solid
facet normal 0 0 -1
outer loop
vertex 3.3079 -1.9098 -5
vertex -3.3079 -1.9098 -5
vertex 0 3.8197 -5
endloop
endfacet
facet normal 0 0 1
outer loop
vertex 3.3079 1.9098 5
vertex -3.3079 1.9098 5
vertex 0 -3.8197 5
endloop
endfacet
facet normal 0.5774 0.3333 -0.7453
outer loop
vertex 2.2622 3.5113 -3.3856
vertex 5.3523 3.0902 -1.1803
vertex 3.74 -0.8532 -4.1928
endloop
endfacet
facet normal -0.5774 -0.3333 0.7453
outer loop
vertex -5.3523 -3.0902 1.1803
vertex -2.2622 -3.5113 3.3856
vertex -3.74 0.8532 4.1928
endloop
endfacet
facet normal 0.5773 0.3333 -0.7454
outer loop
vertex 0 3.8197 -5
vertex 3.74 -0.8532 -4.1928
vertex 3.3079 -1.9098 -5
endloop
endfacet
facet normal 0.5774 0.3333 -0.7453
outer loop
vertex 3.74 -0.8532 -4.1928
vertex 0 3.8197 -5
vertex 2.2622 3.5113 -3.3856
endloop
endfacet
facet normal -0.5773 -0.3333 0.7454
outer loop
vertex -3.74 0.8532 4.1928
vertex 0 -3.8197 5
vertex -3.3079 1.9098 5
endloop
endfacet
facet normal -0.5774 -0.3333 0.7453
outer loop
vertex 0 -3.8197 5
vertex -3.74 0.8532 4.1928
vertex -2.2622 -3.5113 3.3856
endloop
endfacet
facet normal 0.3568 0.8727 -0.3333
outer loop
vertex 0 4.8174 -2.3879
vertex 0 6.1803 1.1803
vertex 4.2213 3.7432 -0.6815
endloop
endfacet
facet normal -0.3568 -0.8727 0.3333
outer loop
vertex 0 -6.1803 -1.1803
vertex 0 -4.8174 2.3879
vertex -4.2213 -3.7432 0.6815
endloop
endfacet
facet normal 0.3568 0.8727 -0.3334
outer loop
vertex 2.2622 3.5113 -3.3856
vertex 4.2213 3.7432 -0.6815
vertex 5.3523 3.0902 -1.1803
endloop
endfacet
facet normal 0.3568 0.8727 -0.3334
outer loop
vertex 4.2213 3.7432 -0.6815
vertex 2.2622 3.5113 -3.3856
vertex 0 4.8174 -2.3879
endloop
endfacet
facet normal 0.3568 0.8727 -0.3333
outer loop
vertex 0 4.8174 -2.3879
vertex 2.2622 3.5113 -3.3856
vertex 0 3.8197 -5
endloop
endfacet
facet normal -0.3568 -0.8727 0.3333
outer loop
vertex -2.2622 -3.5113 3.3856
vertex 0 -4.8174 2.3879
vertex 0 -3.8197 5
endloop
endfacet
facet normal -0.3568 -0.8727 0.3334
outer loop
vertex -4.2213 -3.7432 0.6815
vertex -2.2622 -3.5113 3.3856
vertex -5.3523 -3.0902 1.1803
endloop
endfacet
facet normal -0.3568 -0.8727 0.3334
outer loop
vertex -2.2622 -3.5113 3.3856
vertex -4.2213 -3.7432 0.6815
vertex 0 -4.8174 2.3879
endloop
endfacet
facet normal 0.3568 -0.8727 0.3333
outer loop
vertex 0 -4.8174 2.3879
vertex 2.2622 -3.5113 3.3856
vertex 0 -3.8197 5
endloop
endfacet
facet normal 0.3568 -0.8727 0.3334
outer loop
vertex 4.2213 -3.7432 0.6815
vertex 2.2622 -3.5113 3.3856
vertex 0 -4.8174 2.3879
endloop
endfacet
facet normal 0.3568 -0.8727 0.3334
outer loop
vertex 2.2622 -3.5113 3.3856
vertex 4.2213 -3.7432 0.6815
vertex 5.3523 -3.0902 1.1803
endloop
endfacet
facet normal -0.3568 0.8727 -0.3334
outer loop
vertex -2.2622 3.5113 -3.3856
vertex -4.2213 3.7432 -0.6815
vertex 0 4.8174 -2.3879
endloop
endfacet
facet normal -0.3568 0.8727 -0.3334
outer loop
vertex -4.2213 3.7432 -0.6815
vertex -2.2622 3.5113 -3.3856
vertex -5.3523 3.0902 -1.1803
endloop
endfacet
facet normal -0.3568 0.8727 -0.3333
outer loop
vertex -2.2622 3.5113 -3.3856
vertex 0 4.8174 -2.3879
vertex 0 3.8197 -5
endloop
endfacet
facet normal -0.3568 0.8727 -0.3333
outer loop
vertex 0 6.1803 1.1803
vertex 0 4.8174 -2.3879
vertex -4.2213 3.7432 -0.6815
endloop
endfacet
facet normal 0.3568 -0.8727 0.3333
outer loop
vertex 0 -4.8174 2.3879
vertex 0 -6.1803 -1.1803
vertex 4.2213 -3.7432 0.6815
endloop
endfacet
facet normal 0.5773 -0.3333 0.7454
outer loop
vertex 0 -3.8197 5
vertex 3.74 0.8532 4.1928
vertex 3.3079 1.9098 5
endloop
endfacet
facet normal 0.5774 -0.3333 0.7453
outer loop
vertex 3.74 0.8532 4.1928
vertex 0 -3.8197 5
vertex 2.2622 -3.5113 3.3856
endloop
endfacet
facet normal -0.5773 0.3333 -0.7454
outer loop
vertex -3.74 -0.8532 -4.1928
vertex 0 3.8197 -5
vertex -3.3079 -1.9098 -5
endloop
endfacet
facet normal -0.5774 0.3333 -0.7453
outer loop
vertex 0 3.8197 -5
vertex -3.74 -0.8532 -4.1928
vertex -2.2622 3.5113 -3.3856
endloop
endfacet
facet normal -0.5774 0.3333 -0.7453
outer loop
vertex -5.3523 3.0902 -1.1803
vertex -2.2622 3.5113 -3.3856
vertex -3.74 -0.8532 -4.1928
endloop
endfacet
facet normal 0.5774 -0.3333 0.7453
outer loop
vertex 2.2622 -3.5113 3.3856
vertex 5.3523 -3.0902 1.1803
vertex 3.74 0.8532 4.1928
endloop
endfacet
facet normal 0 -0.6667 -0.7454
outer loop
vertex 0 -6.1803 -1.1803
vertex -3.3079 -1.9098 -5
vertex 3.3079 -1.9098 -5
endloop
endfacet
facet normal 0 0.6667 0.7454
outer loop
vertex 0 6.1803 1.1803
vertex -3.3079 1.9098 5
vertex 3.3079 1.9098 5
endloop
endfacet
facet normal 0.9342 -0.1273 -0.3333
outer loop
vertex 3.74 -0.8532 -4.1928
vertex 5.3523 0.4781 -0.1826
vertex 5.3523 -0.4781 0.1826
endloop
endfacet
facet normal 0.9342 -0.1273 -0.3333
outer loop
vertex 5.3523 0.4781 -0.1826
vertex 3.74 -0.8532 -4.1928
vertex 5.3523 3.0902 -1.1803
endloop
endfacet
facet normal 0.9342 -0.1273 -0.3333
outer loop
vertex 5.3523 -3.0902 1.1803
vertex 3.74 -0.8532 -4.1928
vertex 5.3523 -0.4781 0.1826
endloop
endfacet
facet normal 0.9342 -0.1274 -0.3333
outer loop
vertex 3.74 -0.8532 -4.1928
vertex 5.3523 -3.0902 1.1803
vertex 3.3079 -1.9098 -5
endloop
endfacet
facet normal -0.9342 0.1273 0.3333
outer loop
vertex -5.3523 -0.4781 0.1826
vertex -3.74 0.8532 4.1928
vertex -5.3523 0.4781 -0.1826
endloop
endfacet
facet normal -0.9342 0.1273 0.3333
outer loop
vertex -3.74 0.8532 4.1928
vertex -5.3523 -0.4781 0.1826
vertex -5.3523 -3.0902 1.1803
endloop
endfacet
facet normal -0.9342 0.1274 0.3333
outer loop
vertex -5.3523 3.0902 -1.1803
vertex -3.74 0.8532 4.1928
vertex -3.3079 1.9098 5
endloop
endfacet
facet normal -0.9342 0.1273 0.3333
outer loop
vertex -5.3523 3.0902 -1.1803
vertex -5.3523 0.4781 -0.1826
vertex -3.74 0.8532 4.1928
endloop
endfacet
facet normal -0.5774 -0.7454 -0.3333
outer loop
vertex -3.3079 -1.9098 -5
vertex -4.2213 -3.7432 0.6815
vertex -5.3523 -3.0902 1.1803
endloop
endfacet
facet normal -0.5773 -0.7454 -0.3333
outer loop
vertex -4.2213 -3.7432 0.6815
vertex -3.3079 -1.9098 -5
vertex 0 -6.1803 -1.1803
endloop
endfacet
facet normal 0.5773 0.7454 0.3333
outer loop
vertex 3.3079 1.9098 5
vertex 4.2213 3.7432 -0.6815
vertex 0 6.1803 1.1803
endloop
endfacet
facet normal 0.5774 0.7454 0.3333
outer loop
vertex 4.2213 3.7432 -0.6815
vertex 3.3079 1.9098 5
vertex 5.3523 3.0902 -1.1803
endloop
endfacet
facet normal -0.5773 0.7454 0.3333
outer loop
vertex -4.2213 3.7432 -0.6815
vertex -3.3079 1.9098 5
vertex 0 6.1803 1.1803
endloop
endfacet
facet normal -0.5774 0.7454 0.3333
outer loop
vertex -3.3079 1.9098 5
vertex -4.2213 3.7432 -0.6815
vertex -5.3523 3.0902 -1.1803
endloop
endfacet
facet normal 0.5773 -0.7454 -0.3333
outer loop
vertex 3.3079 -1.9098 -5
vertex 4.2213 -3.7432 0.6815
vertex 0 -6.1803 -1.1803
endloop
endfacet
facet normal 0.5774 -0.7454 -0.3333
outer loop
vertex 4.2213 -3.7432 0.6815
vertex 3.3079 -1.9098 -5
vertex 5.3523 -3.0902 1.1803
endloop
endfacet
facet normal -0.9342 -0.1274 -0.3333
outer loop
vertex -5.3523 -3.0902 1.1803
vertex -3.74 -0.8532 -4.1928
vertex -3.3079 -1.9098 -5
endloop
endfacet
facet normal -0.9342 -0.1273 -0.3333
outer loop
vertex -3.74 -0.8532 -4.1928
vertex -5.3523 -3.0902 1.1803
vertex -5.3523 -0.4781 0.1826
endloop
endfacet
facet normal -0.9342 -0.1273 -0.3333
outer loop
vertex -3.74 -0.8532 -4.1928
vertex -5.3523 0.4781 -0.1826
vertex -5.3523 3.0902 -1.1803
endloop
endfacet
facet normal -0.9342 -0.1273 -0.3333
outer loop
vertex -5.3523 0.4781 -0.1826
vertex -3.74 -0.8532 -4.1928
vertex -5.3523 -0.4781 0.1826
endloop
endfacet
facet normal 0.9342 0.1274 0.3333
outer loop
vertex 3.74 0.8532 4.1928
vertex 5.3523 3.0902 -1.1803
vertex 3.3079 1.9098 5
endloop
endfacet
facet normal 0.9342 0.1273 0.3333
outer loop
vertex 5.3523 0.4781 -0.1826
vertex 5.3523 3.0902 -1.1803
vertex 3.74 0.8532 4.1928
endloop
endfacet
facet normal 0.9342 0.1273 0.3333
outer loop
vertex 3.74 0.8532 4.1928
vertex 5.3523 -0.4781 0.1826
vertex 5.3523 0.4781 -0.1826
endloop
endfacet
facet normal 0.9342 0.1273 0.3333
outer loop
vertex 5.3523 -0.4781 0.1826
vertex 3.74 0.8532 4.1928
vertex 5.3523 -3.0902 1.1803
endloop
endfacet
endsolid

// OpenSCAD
// 20面体骰子
module item(w=10,d=45,p=0){
    rotate([d,0,p])
        cube([w*2,w,w*2],center=true);
}

module dice_20(w=10){
    d=acos(tan(30)/tan(36));//acos(tan(54)/tan(60));
    f=asin(sin(54)/sin(60))*2;
    rotate([d,0,0])
        intersection(){
            intersection_for (a = [ 0 : 4 ])item(w,90-d,72*a);
            intersection_for (a = [ 0 : 4 ])item(w,f-d-90,72*a);
        };
}

w=10;
dice_20(w);
